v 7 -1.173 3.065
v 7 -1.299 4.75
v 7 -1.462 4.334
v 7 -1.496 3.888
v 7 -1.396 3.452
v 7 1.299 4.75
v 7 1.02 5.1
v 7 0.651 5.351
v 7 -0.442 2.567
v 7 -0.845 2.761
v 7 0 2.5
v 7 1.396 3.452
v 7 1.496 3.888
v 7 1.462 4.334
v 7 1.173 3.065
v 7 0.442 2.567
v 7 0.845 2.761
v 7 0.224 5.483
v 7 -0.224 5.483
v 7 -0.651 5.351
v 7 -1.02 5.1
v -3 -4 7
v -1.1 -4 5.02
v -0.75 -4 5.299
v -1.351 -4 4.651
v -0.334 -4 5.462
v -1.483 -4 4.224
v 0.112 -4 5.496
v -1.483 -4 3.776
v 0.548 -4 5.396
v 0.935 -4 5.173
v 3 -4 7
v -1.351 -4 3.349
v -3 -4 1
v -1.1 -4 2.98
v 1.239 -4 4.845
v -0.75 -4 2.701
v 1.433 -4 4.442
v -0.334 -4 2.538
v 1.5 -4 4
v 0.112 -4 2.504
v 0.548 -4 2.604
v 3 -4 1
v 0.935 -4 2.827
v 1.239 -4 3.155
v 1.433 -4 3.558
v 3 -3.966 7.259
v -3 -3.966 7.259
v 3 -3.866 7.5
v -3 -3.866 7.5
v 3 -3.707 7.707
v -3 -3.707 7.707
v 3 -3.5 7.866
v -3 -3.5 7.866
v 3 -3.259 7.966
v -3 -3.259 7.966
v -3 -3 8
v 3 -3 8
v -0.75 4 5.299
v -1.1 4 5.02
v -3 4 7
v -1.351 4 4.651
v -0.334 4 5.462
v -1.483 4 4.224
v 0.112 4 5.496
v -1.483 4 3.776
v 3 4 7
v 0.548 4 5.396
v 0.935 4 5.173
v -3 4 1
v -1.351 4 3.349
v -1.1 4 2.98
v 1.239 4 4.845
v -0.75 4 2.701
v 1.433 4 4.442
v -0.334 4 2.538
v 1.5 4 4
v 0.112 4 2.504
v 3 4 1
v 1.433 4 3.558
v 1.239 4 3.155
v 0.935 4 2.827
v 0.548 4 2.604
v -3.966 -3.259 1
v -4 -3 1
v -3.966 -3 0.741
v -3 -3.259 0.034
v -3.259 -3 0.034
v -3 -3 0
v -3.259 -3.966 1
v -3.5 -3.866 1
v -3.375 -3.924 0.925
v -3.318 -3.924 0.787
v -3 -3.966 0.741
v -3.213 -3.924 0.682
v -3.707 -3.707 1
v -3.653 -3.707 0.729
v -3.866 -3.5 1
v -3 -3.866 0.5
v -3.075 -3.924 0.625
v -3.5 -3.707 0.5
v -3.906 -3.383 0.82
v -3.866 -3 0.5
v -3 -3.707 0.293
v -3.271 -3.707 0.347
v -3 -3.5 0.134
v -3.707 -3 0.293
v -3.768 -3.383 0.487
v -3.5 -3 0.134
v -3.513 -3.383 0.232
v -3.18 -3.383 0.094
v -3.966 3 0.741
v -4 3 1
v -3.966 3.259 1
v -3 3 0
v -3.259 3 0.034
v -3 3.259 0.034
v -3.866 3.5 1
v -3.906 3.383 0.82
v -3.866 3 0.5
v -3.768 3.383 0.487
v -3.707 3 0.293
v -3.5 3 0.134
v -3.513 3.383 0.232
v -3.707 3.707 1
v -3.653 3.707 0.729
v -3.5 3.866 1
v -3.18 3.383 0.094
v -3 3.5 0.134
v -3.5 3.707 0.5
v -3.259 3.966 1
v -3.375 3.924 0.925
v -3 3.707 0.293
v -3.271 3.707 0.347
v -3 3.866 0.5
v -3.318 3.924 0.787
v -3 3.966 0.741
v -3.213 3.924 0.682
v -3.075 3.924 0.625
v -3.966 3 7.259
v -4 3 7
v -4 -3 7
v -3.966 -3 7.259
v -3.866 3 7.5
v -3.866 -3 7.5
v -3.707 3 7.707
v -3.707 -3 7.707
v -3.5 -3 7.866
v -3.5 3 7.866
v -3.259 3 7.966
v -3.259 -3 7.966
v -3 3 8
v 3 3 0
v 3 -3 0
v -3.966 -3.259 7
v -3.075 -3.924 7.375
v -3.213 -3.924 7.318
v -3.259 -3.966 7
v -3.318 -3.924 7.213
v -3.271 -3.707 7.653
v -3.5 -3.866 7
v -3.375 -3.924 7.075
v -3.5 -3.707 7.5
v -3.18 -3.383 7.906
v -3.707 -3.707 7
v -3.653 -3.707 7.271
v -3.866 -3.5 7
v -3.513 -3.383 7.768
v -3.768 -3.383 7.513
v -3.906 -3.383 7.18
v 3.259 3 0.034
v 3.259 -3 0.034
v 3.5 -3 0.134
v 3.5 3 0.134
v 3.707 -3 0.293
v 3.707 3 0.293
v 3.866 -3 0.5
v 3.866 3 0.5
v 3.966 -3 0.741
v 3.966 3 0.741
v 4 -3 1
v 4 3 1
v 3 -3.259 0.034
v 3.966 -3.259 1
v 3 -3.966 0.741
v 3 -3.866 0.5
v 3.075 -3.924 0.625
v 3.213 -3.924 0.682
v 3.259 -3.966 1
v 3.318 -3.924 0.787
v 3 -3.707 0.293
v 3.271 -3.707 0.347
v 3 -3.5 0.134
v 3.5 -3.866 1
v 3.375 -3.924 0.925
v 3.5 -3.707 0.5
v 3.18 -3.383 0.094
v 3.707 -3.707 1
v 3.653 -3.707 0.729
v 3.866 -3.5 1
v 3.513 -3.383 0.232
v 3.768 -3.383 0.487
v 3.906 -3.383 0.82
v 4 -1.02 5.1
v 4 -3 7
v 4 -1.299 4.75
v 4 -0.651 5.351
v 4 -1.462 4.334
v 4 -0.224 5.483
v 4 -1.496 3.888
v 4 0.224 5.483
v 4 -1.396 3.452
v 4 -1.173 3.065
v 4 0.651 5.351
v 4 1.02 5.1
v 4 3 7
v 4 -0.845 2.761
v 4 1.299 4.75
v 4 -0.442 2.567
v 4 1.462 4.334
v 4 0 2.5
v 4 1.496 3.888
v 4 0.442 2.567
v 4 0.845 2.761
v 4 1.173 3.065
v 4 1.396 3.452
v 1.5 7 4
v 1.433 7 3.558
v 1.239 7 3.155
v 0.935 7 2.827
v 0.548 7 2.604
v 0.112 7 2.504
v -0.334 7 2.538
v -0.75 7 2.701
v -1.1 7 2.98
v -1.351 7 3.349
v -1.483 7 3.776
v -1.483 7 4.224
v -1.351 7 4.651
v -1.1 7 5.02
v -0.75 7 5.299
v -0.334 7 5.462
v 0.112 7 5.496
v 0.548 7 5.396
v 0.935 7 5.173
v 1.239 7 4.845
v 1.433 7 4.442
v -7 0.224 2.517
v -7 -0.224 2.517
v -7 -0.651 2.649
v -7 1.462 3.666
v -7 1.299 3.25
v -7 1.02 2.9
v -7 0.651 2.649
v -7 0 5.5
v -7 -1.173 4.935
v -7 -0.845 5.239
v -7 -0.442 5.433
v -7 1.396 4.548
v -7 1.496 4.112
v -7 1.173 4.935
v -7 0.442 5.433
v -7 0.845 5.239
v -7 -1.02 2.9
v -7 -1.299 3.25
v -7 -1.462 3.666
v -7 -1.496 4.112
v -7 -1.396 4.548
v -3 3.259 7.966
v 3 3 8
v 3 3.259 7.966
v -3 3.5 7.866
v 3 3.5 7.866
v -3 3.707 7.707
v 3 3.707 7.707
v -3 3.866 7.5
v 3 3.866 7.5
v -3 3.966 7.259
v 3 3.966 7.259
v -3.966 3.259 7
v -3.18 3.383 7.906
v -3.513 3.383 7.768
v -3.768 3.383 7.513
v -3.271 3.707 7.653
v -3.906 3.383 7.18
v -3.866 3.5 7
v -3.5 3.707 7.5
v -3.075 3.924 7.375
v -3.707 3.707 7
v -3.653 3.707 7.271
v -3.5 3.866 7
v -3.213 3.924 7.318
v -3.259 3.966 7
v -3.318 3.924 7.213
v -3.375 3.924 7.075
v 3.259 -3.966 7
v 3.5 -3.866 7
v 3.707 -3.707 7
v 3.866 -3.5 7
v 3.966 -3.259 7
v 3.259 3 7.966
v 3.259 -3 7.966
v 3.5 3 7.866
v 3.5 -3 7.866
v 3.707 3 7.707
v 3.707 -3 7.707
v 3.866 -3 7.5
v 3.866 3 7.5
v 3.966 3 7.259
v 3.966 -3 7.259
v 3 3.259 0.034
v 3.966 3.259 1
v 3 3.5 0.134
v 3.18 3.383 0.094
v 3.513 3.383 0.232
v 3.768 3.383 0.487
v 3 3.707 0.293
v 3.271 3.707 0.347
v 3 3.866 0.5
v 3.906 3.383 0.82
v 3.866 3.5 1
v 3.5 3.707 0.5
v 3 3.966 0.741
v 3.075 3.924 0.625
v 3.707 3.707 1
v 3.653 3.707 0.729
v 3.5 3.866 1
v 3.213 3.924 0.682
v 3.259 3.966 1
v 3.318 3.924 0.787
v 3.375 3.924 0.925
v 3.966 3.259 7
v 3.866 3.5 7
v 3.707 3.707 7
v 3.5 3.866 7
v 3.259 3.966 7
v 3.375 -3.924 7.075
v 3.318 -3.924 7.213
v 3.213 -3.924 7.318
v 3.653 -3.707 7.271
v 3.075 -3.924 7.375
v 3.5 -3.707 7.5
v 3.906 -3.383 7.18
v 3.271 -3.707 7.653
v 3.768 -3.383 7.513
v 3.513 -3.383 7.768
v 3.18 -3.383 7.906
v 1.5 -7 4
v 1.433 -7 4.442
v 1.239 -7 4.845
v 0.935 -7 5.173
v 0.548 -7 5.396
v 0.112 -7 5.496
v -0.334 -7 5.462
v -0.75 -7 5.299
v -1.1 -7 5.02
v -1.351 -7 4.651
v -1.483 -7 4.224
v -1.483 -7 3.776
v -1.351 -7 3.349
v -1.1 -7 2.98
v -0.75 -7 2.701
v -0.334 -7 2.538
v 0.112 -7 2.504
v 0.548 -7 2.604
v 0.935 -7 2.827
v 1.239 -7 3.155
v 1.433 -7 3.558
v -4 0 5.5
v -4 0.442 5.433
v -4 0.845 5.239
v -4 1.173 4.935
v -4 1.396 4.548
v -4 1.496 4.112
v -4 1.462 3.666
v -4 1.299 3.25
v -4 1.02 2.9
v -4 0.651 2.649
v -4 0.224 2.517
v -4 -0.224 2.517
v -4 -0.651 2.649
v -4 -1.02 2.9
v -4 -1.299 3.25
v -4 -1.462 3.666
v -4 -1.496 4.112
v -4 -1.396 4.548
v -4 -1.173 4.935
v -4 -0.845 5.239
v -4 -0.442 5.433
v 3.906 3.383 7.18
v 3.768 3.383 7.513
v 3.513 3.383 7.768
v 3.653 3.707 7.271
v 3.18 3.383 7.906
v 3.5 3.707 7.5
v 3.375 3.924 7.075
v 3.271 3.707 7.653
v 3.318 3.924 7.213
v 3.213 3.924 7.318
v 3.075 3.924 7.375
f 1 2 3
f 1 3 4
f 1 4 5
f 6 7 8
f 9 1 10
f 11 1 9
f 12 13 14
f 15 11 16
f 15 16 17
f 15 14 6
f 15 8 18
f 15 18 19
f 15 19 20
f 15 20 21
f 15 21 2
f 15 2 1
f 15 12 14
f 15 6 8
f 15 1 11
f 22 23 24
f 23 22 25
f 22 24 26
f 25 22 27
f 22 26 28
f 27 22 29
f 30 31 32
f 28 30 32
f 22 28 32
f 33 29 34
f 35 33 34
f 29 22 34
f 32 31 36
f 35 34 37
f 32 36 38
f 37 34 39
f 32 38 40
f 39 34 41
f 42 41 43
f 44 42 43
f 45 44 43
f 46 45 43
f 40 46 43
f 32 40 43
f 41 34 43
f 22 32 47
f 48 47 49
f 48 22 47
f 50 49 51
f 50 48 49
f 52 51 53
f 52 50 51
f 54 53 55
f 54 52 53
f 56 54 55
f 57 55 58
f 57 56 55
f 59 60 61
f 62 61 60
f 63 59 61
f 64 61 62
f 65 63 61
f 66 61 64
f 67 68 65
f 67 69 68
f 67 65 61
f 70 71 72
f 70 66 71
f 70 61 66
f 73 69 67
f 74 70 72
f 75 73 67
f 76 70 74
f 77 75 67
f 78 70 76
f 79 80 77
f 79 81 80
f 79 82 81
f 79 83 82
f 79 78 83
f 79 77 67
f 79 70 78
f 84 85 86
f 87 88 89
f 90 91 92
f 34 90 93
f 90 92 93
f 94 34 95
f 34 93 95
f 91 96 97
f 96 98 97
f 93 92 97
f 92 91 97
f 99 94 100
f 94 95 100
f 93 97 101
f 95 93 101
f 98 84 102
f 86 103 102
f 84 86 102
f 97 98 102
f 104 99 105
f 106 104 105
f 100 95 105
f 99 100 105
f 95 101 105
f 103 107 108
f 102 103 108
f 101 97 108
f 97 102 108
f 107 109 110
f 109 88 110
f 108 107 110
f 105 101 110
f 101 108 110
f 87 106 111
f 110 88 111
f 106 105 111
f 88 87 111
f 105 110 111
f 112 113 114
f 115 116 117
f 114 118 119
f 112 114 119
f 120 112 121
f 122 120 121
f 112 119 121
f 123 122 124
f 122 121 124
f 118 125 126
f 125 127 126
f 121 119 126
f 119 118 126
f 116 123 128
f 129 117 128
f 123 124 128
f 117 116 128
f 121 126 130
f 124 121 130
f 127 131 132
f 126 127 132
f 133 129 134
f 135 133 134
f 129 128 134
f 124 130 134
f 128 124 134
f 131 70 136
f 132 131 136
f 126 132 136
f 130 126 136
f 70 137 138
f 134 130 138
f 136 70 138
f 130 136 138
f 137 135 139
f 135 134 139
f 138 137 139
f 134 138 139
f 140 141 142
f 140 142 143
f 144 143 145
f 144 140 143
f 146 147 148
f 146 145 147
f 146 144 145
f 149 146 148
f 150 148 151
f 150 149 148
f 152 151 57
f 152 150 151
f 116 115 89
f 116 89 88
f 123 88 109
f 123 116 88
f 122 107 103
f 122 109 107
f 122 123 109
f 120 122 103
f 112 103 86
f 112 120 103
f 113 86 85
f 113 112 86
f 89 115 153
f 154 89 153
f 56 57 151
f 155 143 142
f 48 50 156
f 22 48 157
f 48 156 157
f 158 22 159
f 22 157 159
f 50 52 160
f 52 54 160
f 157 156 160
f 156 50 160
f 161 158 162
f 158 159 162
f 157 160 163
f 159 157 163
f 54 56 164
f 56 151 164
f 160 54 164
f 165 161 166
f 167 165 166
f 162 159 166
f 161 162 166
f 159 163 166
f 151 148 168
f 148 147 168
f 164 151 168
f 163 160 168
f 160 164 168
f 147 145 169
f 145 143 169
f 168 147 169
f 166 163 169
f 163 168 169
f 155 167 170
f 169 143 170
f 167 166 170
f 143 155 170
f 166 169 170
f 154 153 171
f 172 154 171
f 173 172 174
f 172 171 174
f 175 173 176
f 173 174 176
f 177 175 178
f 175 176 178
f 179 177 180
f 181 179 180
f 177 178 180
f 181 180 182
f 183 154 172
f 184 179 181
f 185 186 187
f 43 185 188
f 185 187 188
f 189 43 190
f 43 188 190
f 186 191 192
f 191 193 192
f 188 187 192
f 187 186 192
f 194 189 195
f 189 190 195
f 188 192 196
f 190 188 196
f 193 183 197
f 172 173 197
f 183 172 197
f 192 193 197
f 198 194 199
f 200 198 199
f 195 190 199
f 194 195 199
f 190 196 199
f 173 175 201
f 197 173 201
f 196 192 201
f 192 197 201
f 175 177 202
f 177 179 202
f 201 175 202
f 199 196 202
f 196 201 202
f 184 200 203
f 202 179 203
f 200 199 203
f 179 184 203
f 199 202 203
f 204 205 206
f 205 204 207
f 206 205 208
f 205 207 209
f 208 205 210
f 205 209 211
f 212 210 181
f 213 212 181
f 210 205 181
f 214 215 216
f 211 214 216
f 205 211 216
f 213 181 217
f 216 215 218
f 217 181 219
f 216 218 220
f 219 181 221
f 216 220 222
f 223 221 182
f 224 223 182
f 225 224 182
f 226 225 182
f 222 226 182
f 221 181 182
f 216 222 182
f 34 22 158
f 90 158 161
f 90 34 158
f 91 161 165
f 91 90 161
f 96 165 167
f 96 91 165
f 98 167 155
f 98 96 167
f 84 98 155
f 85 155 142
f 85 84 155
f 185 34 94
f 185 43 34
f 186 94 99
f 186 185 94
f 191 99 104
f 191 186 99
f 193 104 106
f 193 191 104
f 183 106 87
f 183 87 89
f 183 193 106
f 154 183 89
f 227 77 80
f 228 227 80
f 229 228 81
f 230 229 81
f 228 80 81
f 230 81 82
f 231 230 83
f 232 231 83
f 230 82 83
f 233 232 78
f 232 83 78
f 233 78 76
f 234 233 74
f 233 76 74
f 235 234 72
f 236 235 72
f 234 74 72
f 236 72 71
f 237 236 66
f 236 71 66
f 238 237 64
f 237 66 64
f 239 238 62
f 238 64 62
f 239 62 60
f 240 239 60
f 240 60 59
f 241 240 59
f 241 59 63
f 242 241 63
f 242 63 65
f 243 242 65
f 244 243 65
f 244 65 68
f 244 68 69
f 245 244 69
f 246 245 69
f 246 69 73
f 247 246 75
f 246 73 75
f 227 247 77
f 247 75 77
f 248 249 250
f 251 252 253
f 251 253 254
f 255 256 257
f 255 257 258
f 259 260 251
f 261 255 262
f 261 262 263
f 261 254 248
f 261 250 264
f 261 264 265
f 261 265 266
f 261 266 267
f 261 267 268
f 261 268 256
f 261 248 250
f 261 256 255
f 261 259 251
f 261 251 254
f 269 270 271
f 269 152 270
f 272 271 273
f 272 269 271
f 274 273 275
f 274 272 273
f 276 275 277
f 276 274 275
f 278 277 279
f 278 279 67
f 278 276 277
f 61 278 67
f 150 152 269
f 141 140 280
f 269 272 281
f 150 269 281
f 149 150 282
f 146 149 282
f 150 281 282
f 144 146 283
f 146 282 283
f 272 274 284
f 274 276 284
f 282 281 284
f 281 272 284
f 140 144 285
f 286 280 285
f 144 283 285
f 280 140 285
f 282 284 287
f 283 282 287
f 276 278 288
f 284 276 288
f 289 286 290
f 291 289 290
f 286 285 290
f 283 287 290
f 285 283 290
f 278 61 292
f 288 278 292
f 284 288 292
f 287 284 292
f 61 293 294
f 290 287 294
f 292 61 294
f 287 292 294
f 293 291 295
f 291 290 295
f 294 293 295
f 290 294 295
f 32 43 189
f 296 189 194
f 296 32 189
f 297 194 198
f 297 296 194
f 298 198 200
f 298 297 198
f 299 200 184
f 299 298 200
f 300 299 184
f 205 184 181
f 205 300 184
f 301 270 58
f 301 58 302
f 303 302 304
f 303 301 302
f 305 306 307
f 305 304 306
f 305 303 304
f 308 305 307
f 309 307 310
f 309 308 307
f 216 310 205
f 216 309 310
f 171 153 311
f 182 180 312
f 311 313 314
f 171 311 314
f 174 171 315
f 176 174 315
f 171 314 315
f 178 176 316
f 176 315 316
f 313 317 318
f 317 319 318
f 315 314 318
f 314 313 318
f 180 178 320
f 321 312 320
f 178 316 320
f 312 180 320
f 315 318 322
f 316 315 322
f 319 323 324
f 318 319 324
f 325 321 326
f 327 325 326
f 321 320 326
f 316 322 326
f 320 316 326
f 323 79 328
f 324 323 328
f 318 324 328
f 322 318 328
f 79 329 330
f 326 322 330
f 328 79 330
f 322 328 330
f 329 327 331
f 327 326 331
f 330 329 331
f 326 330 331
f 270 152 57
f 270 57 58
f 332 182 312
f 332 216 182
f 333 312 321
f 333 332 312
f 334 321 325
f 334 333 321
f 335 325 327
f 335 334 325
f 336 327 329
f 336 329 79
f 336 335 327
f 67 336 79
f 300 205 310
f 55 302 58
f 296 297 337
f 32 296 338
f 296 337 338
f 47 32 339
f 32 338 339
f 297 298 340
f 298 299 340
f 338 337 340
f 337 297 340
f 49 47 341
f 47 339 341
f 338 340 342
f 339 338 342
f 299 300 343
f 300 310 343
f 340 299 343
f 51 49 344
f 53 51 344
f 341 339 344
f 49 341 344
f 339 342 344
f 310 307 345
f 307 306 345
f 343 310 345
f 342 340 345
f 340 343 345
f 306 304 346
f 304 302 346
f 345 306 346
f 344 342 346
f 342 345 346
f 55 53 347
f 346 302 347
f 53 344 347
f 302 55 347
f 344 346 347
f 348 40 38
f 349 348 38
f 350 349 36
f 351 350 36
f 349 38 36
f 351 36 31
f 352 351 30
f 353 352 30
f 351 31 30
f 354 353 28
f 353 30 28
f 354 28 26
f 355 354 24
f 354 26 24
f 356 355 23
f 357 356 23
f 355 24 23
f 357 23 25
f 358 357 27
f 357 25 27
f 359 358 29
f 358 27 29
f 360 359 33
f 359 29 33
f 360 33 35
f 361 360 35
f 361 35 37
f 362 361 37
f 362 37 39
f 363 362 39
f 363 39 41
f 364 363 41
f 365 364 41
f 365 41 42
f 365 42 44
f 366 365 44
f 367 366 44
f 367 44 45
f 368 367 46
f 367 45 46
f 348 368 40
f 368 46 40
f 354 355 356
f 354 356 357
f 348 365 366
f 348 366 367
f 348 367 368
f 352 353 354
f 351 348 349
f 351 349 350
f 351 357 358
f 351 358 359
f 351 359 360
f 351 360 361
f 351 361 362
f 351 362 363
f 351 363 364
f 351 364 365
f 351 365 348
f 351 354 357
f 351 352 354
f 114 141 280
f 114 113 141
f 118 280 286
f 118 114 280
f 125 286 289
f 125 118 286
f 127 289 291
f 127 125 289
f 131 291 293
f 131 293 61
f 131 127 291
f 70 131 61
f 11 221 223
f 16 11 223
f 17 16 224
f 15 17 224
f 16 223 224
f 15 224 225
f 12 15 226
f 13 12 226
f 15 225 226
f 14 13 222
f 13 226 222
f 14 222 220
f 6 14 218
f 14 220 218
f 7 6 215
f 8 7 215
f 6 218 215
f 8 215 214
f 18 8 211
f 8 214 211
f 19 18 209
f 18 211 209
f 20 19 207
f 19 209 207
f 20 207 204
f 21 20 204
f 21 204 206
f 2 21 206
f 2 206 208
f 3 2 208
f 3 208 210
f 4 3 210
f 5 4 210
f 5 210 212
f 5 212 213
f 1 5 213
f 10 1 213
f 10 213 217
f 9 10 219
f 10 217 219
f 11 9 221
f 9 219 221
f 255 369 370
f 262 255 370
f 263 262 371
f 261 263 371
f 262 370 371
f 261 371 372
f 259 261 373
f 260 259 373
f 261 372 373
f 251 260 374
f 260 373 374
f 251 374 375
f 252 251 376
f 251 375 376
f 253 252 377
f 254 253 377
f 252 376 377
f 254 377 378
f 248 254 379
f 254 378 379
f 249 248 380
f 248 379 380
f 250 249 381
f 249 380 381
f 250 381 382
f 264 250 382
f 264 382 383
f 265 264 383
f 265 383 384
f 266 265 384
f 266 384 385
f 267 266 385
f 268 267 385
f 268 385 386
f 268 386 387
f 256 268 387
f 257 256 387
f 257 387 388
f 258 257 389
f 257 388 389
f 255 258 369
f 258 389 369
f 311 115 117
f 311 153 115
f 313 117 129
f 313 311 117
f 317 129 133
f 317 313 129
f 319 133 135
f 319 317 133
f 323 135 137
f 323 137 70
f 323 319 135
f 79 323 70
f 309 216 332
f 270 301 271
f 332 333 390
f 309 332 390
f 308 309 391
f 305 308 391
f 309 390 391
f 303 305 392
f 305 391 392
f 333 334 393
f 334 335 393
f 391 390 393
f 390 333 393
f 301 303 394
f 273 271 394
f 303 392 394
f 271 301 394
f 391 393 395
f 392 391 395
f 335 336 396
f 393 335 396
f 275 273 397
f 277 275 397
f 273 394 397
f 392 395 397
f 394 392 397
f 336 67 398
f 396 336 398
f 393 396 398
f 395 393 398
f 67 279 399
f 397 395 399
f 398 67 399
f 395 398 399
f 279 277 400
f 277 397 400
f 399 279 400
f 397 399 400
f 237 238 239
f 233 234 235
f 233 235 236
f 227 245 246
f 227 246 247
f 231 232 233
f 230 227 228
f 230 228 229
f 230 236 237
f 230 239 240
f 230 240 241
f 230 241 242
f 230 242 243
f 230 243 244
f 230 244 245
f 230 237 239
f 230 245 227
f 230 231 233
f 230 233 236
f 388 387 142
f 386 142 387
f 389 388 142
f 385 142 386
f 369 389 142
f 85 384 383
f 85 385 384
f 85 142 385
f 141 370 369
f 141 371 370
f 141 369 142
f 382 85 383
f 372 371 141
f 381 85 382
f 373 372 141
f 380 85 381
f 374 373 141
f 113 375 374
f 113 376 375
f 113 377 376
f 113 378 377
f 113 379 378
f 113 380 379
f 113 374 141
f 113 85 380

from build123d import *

# Parameters (mm, degrees)
SKETCH1_W           = 8
SKETCH1_H           = 8
BOSS_EXTRUDE1_DEPTH = 8
SKETCH2_R           = 1.5
BOSS_EXTRUDE2_DEPTH = 3
SKETCH3_R           = 1.5
BOSS_EXTRUDE3_DEPTH = 3
SKETCH4_R           = 1.5
BOSS_EXTRUDE4_DEPTH = 3
SKETCH5_R           = 1.5
BOSS_EXTRUDE5_DEPTH = 3
FILLET3_R           = 1
FILLET4_R           = 1
FILLET5_R           = 1
FILLET6_R           = 1
FILLET7_R           = 1
FILLET8_R           = 1


with BuildPart() as part:
    # Sketch1 → Boss-Extrude1 (new body)
    with BuildSketch(Plane.XY):
        Rectangle(SKETCH1_W, SKETCH1_H)
    extrude(amount=BOSS_EXTRUDE1_DEPTH)

    # Sketch2 → Boss-Extrude2 (add)
    with BuildSketch(Plane(origin=(0, 4, 0), x_dir=(1, 0, 0), z_dir=(0, 1, 0))):
        with Locations((0, -4)):
            Circle(SKETCH2_R)
    extrude(amount=BOSS_EXTRUDE2_DEPTH)

    # Sketch3 → Boss-Extrude3 (add)
    with BuildSketch(Plane(origin=(4, 0, 0), x_dir=(0, 0, -1), z_dir=(1, 0, 0))):
        with Locations((-4, 0)):
            Circle(SKETCH3_R)
    extrude(amount=BOSS_EXTRUDE3_DEPTH)

    # Sketch4 → Boss-Extrude4 (add)
    with BuildSketch(Plane.XZ.offset(4)):
        with Locations((0, 4)):
            Circle(SKETCH4_R)
    extrude(amount=BOSS_EXTRUDE4_DEPTH)

    # Sketch5 → Boss-Extrude5 (add)
    with BuildSketch(Plane.ZY.offset(4)):
        with Locations((4, 0)):
            Circle(SKETCH5_R)
    extrude(amount=BOSS_EXTRUDE5_DEPTH)

    # Fillet3
    fillet3_edges = [part.edges().sort_by_distance(p)[0] for p in [
        (4, 0, 0),
    ]]
    fillet(fillet3_edges, radius=FILLET3_R)

    # Fillet4
    fillet4_edges = [part.edges().sort_by_distance(p)[0] for p in [
        (-4, 0, 0),
    ]]
    fillet(fillet4_edges, radius=FILLET4_R)

    # Fillet5
    fillet5_edges = [part.edges().sort_by_distance(p)[0] for p in [
        (-4, 0, 8),
    ]]
    fillet(fillet5_edges, radius=FILLET5_R)

    # Fillet6
    fillet6_edges = [part.edges().sort_by_distance(p)[0] for p in [
        (4, 0, 8),
    ]]
    fillet(fillet6_edges, radius=FILLET6_R)

    # Fillet7
    fillet7_edges = [part.edges().sort_by_distance(p)[0] for p in [
        (0, -4, 0),
        (-4, -4, 4),
        (0, -4, 8),
        (4, -4, 4),
    ]]
    fillet(fillet7_edges, radius=FILLET7_R)

    # Fillet8
    fillet8_edges = [part.edges().sort_by_distance(p)[0] for p in [
        (0, 4, 0),
        (-4, 4, 4),
        (0, 4, 8),
        (4, 4, 4),
    ]]
    fillet(fillet8_edges, radius=FILLET8_R)


solid = part.part
